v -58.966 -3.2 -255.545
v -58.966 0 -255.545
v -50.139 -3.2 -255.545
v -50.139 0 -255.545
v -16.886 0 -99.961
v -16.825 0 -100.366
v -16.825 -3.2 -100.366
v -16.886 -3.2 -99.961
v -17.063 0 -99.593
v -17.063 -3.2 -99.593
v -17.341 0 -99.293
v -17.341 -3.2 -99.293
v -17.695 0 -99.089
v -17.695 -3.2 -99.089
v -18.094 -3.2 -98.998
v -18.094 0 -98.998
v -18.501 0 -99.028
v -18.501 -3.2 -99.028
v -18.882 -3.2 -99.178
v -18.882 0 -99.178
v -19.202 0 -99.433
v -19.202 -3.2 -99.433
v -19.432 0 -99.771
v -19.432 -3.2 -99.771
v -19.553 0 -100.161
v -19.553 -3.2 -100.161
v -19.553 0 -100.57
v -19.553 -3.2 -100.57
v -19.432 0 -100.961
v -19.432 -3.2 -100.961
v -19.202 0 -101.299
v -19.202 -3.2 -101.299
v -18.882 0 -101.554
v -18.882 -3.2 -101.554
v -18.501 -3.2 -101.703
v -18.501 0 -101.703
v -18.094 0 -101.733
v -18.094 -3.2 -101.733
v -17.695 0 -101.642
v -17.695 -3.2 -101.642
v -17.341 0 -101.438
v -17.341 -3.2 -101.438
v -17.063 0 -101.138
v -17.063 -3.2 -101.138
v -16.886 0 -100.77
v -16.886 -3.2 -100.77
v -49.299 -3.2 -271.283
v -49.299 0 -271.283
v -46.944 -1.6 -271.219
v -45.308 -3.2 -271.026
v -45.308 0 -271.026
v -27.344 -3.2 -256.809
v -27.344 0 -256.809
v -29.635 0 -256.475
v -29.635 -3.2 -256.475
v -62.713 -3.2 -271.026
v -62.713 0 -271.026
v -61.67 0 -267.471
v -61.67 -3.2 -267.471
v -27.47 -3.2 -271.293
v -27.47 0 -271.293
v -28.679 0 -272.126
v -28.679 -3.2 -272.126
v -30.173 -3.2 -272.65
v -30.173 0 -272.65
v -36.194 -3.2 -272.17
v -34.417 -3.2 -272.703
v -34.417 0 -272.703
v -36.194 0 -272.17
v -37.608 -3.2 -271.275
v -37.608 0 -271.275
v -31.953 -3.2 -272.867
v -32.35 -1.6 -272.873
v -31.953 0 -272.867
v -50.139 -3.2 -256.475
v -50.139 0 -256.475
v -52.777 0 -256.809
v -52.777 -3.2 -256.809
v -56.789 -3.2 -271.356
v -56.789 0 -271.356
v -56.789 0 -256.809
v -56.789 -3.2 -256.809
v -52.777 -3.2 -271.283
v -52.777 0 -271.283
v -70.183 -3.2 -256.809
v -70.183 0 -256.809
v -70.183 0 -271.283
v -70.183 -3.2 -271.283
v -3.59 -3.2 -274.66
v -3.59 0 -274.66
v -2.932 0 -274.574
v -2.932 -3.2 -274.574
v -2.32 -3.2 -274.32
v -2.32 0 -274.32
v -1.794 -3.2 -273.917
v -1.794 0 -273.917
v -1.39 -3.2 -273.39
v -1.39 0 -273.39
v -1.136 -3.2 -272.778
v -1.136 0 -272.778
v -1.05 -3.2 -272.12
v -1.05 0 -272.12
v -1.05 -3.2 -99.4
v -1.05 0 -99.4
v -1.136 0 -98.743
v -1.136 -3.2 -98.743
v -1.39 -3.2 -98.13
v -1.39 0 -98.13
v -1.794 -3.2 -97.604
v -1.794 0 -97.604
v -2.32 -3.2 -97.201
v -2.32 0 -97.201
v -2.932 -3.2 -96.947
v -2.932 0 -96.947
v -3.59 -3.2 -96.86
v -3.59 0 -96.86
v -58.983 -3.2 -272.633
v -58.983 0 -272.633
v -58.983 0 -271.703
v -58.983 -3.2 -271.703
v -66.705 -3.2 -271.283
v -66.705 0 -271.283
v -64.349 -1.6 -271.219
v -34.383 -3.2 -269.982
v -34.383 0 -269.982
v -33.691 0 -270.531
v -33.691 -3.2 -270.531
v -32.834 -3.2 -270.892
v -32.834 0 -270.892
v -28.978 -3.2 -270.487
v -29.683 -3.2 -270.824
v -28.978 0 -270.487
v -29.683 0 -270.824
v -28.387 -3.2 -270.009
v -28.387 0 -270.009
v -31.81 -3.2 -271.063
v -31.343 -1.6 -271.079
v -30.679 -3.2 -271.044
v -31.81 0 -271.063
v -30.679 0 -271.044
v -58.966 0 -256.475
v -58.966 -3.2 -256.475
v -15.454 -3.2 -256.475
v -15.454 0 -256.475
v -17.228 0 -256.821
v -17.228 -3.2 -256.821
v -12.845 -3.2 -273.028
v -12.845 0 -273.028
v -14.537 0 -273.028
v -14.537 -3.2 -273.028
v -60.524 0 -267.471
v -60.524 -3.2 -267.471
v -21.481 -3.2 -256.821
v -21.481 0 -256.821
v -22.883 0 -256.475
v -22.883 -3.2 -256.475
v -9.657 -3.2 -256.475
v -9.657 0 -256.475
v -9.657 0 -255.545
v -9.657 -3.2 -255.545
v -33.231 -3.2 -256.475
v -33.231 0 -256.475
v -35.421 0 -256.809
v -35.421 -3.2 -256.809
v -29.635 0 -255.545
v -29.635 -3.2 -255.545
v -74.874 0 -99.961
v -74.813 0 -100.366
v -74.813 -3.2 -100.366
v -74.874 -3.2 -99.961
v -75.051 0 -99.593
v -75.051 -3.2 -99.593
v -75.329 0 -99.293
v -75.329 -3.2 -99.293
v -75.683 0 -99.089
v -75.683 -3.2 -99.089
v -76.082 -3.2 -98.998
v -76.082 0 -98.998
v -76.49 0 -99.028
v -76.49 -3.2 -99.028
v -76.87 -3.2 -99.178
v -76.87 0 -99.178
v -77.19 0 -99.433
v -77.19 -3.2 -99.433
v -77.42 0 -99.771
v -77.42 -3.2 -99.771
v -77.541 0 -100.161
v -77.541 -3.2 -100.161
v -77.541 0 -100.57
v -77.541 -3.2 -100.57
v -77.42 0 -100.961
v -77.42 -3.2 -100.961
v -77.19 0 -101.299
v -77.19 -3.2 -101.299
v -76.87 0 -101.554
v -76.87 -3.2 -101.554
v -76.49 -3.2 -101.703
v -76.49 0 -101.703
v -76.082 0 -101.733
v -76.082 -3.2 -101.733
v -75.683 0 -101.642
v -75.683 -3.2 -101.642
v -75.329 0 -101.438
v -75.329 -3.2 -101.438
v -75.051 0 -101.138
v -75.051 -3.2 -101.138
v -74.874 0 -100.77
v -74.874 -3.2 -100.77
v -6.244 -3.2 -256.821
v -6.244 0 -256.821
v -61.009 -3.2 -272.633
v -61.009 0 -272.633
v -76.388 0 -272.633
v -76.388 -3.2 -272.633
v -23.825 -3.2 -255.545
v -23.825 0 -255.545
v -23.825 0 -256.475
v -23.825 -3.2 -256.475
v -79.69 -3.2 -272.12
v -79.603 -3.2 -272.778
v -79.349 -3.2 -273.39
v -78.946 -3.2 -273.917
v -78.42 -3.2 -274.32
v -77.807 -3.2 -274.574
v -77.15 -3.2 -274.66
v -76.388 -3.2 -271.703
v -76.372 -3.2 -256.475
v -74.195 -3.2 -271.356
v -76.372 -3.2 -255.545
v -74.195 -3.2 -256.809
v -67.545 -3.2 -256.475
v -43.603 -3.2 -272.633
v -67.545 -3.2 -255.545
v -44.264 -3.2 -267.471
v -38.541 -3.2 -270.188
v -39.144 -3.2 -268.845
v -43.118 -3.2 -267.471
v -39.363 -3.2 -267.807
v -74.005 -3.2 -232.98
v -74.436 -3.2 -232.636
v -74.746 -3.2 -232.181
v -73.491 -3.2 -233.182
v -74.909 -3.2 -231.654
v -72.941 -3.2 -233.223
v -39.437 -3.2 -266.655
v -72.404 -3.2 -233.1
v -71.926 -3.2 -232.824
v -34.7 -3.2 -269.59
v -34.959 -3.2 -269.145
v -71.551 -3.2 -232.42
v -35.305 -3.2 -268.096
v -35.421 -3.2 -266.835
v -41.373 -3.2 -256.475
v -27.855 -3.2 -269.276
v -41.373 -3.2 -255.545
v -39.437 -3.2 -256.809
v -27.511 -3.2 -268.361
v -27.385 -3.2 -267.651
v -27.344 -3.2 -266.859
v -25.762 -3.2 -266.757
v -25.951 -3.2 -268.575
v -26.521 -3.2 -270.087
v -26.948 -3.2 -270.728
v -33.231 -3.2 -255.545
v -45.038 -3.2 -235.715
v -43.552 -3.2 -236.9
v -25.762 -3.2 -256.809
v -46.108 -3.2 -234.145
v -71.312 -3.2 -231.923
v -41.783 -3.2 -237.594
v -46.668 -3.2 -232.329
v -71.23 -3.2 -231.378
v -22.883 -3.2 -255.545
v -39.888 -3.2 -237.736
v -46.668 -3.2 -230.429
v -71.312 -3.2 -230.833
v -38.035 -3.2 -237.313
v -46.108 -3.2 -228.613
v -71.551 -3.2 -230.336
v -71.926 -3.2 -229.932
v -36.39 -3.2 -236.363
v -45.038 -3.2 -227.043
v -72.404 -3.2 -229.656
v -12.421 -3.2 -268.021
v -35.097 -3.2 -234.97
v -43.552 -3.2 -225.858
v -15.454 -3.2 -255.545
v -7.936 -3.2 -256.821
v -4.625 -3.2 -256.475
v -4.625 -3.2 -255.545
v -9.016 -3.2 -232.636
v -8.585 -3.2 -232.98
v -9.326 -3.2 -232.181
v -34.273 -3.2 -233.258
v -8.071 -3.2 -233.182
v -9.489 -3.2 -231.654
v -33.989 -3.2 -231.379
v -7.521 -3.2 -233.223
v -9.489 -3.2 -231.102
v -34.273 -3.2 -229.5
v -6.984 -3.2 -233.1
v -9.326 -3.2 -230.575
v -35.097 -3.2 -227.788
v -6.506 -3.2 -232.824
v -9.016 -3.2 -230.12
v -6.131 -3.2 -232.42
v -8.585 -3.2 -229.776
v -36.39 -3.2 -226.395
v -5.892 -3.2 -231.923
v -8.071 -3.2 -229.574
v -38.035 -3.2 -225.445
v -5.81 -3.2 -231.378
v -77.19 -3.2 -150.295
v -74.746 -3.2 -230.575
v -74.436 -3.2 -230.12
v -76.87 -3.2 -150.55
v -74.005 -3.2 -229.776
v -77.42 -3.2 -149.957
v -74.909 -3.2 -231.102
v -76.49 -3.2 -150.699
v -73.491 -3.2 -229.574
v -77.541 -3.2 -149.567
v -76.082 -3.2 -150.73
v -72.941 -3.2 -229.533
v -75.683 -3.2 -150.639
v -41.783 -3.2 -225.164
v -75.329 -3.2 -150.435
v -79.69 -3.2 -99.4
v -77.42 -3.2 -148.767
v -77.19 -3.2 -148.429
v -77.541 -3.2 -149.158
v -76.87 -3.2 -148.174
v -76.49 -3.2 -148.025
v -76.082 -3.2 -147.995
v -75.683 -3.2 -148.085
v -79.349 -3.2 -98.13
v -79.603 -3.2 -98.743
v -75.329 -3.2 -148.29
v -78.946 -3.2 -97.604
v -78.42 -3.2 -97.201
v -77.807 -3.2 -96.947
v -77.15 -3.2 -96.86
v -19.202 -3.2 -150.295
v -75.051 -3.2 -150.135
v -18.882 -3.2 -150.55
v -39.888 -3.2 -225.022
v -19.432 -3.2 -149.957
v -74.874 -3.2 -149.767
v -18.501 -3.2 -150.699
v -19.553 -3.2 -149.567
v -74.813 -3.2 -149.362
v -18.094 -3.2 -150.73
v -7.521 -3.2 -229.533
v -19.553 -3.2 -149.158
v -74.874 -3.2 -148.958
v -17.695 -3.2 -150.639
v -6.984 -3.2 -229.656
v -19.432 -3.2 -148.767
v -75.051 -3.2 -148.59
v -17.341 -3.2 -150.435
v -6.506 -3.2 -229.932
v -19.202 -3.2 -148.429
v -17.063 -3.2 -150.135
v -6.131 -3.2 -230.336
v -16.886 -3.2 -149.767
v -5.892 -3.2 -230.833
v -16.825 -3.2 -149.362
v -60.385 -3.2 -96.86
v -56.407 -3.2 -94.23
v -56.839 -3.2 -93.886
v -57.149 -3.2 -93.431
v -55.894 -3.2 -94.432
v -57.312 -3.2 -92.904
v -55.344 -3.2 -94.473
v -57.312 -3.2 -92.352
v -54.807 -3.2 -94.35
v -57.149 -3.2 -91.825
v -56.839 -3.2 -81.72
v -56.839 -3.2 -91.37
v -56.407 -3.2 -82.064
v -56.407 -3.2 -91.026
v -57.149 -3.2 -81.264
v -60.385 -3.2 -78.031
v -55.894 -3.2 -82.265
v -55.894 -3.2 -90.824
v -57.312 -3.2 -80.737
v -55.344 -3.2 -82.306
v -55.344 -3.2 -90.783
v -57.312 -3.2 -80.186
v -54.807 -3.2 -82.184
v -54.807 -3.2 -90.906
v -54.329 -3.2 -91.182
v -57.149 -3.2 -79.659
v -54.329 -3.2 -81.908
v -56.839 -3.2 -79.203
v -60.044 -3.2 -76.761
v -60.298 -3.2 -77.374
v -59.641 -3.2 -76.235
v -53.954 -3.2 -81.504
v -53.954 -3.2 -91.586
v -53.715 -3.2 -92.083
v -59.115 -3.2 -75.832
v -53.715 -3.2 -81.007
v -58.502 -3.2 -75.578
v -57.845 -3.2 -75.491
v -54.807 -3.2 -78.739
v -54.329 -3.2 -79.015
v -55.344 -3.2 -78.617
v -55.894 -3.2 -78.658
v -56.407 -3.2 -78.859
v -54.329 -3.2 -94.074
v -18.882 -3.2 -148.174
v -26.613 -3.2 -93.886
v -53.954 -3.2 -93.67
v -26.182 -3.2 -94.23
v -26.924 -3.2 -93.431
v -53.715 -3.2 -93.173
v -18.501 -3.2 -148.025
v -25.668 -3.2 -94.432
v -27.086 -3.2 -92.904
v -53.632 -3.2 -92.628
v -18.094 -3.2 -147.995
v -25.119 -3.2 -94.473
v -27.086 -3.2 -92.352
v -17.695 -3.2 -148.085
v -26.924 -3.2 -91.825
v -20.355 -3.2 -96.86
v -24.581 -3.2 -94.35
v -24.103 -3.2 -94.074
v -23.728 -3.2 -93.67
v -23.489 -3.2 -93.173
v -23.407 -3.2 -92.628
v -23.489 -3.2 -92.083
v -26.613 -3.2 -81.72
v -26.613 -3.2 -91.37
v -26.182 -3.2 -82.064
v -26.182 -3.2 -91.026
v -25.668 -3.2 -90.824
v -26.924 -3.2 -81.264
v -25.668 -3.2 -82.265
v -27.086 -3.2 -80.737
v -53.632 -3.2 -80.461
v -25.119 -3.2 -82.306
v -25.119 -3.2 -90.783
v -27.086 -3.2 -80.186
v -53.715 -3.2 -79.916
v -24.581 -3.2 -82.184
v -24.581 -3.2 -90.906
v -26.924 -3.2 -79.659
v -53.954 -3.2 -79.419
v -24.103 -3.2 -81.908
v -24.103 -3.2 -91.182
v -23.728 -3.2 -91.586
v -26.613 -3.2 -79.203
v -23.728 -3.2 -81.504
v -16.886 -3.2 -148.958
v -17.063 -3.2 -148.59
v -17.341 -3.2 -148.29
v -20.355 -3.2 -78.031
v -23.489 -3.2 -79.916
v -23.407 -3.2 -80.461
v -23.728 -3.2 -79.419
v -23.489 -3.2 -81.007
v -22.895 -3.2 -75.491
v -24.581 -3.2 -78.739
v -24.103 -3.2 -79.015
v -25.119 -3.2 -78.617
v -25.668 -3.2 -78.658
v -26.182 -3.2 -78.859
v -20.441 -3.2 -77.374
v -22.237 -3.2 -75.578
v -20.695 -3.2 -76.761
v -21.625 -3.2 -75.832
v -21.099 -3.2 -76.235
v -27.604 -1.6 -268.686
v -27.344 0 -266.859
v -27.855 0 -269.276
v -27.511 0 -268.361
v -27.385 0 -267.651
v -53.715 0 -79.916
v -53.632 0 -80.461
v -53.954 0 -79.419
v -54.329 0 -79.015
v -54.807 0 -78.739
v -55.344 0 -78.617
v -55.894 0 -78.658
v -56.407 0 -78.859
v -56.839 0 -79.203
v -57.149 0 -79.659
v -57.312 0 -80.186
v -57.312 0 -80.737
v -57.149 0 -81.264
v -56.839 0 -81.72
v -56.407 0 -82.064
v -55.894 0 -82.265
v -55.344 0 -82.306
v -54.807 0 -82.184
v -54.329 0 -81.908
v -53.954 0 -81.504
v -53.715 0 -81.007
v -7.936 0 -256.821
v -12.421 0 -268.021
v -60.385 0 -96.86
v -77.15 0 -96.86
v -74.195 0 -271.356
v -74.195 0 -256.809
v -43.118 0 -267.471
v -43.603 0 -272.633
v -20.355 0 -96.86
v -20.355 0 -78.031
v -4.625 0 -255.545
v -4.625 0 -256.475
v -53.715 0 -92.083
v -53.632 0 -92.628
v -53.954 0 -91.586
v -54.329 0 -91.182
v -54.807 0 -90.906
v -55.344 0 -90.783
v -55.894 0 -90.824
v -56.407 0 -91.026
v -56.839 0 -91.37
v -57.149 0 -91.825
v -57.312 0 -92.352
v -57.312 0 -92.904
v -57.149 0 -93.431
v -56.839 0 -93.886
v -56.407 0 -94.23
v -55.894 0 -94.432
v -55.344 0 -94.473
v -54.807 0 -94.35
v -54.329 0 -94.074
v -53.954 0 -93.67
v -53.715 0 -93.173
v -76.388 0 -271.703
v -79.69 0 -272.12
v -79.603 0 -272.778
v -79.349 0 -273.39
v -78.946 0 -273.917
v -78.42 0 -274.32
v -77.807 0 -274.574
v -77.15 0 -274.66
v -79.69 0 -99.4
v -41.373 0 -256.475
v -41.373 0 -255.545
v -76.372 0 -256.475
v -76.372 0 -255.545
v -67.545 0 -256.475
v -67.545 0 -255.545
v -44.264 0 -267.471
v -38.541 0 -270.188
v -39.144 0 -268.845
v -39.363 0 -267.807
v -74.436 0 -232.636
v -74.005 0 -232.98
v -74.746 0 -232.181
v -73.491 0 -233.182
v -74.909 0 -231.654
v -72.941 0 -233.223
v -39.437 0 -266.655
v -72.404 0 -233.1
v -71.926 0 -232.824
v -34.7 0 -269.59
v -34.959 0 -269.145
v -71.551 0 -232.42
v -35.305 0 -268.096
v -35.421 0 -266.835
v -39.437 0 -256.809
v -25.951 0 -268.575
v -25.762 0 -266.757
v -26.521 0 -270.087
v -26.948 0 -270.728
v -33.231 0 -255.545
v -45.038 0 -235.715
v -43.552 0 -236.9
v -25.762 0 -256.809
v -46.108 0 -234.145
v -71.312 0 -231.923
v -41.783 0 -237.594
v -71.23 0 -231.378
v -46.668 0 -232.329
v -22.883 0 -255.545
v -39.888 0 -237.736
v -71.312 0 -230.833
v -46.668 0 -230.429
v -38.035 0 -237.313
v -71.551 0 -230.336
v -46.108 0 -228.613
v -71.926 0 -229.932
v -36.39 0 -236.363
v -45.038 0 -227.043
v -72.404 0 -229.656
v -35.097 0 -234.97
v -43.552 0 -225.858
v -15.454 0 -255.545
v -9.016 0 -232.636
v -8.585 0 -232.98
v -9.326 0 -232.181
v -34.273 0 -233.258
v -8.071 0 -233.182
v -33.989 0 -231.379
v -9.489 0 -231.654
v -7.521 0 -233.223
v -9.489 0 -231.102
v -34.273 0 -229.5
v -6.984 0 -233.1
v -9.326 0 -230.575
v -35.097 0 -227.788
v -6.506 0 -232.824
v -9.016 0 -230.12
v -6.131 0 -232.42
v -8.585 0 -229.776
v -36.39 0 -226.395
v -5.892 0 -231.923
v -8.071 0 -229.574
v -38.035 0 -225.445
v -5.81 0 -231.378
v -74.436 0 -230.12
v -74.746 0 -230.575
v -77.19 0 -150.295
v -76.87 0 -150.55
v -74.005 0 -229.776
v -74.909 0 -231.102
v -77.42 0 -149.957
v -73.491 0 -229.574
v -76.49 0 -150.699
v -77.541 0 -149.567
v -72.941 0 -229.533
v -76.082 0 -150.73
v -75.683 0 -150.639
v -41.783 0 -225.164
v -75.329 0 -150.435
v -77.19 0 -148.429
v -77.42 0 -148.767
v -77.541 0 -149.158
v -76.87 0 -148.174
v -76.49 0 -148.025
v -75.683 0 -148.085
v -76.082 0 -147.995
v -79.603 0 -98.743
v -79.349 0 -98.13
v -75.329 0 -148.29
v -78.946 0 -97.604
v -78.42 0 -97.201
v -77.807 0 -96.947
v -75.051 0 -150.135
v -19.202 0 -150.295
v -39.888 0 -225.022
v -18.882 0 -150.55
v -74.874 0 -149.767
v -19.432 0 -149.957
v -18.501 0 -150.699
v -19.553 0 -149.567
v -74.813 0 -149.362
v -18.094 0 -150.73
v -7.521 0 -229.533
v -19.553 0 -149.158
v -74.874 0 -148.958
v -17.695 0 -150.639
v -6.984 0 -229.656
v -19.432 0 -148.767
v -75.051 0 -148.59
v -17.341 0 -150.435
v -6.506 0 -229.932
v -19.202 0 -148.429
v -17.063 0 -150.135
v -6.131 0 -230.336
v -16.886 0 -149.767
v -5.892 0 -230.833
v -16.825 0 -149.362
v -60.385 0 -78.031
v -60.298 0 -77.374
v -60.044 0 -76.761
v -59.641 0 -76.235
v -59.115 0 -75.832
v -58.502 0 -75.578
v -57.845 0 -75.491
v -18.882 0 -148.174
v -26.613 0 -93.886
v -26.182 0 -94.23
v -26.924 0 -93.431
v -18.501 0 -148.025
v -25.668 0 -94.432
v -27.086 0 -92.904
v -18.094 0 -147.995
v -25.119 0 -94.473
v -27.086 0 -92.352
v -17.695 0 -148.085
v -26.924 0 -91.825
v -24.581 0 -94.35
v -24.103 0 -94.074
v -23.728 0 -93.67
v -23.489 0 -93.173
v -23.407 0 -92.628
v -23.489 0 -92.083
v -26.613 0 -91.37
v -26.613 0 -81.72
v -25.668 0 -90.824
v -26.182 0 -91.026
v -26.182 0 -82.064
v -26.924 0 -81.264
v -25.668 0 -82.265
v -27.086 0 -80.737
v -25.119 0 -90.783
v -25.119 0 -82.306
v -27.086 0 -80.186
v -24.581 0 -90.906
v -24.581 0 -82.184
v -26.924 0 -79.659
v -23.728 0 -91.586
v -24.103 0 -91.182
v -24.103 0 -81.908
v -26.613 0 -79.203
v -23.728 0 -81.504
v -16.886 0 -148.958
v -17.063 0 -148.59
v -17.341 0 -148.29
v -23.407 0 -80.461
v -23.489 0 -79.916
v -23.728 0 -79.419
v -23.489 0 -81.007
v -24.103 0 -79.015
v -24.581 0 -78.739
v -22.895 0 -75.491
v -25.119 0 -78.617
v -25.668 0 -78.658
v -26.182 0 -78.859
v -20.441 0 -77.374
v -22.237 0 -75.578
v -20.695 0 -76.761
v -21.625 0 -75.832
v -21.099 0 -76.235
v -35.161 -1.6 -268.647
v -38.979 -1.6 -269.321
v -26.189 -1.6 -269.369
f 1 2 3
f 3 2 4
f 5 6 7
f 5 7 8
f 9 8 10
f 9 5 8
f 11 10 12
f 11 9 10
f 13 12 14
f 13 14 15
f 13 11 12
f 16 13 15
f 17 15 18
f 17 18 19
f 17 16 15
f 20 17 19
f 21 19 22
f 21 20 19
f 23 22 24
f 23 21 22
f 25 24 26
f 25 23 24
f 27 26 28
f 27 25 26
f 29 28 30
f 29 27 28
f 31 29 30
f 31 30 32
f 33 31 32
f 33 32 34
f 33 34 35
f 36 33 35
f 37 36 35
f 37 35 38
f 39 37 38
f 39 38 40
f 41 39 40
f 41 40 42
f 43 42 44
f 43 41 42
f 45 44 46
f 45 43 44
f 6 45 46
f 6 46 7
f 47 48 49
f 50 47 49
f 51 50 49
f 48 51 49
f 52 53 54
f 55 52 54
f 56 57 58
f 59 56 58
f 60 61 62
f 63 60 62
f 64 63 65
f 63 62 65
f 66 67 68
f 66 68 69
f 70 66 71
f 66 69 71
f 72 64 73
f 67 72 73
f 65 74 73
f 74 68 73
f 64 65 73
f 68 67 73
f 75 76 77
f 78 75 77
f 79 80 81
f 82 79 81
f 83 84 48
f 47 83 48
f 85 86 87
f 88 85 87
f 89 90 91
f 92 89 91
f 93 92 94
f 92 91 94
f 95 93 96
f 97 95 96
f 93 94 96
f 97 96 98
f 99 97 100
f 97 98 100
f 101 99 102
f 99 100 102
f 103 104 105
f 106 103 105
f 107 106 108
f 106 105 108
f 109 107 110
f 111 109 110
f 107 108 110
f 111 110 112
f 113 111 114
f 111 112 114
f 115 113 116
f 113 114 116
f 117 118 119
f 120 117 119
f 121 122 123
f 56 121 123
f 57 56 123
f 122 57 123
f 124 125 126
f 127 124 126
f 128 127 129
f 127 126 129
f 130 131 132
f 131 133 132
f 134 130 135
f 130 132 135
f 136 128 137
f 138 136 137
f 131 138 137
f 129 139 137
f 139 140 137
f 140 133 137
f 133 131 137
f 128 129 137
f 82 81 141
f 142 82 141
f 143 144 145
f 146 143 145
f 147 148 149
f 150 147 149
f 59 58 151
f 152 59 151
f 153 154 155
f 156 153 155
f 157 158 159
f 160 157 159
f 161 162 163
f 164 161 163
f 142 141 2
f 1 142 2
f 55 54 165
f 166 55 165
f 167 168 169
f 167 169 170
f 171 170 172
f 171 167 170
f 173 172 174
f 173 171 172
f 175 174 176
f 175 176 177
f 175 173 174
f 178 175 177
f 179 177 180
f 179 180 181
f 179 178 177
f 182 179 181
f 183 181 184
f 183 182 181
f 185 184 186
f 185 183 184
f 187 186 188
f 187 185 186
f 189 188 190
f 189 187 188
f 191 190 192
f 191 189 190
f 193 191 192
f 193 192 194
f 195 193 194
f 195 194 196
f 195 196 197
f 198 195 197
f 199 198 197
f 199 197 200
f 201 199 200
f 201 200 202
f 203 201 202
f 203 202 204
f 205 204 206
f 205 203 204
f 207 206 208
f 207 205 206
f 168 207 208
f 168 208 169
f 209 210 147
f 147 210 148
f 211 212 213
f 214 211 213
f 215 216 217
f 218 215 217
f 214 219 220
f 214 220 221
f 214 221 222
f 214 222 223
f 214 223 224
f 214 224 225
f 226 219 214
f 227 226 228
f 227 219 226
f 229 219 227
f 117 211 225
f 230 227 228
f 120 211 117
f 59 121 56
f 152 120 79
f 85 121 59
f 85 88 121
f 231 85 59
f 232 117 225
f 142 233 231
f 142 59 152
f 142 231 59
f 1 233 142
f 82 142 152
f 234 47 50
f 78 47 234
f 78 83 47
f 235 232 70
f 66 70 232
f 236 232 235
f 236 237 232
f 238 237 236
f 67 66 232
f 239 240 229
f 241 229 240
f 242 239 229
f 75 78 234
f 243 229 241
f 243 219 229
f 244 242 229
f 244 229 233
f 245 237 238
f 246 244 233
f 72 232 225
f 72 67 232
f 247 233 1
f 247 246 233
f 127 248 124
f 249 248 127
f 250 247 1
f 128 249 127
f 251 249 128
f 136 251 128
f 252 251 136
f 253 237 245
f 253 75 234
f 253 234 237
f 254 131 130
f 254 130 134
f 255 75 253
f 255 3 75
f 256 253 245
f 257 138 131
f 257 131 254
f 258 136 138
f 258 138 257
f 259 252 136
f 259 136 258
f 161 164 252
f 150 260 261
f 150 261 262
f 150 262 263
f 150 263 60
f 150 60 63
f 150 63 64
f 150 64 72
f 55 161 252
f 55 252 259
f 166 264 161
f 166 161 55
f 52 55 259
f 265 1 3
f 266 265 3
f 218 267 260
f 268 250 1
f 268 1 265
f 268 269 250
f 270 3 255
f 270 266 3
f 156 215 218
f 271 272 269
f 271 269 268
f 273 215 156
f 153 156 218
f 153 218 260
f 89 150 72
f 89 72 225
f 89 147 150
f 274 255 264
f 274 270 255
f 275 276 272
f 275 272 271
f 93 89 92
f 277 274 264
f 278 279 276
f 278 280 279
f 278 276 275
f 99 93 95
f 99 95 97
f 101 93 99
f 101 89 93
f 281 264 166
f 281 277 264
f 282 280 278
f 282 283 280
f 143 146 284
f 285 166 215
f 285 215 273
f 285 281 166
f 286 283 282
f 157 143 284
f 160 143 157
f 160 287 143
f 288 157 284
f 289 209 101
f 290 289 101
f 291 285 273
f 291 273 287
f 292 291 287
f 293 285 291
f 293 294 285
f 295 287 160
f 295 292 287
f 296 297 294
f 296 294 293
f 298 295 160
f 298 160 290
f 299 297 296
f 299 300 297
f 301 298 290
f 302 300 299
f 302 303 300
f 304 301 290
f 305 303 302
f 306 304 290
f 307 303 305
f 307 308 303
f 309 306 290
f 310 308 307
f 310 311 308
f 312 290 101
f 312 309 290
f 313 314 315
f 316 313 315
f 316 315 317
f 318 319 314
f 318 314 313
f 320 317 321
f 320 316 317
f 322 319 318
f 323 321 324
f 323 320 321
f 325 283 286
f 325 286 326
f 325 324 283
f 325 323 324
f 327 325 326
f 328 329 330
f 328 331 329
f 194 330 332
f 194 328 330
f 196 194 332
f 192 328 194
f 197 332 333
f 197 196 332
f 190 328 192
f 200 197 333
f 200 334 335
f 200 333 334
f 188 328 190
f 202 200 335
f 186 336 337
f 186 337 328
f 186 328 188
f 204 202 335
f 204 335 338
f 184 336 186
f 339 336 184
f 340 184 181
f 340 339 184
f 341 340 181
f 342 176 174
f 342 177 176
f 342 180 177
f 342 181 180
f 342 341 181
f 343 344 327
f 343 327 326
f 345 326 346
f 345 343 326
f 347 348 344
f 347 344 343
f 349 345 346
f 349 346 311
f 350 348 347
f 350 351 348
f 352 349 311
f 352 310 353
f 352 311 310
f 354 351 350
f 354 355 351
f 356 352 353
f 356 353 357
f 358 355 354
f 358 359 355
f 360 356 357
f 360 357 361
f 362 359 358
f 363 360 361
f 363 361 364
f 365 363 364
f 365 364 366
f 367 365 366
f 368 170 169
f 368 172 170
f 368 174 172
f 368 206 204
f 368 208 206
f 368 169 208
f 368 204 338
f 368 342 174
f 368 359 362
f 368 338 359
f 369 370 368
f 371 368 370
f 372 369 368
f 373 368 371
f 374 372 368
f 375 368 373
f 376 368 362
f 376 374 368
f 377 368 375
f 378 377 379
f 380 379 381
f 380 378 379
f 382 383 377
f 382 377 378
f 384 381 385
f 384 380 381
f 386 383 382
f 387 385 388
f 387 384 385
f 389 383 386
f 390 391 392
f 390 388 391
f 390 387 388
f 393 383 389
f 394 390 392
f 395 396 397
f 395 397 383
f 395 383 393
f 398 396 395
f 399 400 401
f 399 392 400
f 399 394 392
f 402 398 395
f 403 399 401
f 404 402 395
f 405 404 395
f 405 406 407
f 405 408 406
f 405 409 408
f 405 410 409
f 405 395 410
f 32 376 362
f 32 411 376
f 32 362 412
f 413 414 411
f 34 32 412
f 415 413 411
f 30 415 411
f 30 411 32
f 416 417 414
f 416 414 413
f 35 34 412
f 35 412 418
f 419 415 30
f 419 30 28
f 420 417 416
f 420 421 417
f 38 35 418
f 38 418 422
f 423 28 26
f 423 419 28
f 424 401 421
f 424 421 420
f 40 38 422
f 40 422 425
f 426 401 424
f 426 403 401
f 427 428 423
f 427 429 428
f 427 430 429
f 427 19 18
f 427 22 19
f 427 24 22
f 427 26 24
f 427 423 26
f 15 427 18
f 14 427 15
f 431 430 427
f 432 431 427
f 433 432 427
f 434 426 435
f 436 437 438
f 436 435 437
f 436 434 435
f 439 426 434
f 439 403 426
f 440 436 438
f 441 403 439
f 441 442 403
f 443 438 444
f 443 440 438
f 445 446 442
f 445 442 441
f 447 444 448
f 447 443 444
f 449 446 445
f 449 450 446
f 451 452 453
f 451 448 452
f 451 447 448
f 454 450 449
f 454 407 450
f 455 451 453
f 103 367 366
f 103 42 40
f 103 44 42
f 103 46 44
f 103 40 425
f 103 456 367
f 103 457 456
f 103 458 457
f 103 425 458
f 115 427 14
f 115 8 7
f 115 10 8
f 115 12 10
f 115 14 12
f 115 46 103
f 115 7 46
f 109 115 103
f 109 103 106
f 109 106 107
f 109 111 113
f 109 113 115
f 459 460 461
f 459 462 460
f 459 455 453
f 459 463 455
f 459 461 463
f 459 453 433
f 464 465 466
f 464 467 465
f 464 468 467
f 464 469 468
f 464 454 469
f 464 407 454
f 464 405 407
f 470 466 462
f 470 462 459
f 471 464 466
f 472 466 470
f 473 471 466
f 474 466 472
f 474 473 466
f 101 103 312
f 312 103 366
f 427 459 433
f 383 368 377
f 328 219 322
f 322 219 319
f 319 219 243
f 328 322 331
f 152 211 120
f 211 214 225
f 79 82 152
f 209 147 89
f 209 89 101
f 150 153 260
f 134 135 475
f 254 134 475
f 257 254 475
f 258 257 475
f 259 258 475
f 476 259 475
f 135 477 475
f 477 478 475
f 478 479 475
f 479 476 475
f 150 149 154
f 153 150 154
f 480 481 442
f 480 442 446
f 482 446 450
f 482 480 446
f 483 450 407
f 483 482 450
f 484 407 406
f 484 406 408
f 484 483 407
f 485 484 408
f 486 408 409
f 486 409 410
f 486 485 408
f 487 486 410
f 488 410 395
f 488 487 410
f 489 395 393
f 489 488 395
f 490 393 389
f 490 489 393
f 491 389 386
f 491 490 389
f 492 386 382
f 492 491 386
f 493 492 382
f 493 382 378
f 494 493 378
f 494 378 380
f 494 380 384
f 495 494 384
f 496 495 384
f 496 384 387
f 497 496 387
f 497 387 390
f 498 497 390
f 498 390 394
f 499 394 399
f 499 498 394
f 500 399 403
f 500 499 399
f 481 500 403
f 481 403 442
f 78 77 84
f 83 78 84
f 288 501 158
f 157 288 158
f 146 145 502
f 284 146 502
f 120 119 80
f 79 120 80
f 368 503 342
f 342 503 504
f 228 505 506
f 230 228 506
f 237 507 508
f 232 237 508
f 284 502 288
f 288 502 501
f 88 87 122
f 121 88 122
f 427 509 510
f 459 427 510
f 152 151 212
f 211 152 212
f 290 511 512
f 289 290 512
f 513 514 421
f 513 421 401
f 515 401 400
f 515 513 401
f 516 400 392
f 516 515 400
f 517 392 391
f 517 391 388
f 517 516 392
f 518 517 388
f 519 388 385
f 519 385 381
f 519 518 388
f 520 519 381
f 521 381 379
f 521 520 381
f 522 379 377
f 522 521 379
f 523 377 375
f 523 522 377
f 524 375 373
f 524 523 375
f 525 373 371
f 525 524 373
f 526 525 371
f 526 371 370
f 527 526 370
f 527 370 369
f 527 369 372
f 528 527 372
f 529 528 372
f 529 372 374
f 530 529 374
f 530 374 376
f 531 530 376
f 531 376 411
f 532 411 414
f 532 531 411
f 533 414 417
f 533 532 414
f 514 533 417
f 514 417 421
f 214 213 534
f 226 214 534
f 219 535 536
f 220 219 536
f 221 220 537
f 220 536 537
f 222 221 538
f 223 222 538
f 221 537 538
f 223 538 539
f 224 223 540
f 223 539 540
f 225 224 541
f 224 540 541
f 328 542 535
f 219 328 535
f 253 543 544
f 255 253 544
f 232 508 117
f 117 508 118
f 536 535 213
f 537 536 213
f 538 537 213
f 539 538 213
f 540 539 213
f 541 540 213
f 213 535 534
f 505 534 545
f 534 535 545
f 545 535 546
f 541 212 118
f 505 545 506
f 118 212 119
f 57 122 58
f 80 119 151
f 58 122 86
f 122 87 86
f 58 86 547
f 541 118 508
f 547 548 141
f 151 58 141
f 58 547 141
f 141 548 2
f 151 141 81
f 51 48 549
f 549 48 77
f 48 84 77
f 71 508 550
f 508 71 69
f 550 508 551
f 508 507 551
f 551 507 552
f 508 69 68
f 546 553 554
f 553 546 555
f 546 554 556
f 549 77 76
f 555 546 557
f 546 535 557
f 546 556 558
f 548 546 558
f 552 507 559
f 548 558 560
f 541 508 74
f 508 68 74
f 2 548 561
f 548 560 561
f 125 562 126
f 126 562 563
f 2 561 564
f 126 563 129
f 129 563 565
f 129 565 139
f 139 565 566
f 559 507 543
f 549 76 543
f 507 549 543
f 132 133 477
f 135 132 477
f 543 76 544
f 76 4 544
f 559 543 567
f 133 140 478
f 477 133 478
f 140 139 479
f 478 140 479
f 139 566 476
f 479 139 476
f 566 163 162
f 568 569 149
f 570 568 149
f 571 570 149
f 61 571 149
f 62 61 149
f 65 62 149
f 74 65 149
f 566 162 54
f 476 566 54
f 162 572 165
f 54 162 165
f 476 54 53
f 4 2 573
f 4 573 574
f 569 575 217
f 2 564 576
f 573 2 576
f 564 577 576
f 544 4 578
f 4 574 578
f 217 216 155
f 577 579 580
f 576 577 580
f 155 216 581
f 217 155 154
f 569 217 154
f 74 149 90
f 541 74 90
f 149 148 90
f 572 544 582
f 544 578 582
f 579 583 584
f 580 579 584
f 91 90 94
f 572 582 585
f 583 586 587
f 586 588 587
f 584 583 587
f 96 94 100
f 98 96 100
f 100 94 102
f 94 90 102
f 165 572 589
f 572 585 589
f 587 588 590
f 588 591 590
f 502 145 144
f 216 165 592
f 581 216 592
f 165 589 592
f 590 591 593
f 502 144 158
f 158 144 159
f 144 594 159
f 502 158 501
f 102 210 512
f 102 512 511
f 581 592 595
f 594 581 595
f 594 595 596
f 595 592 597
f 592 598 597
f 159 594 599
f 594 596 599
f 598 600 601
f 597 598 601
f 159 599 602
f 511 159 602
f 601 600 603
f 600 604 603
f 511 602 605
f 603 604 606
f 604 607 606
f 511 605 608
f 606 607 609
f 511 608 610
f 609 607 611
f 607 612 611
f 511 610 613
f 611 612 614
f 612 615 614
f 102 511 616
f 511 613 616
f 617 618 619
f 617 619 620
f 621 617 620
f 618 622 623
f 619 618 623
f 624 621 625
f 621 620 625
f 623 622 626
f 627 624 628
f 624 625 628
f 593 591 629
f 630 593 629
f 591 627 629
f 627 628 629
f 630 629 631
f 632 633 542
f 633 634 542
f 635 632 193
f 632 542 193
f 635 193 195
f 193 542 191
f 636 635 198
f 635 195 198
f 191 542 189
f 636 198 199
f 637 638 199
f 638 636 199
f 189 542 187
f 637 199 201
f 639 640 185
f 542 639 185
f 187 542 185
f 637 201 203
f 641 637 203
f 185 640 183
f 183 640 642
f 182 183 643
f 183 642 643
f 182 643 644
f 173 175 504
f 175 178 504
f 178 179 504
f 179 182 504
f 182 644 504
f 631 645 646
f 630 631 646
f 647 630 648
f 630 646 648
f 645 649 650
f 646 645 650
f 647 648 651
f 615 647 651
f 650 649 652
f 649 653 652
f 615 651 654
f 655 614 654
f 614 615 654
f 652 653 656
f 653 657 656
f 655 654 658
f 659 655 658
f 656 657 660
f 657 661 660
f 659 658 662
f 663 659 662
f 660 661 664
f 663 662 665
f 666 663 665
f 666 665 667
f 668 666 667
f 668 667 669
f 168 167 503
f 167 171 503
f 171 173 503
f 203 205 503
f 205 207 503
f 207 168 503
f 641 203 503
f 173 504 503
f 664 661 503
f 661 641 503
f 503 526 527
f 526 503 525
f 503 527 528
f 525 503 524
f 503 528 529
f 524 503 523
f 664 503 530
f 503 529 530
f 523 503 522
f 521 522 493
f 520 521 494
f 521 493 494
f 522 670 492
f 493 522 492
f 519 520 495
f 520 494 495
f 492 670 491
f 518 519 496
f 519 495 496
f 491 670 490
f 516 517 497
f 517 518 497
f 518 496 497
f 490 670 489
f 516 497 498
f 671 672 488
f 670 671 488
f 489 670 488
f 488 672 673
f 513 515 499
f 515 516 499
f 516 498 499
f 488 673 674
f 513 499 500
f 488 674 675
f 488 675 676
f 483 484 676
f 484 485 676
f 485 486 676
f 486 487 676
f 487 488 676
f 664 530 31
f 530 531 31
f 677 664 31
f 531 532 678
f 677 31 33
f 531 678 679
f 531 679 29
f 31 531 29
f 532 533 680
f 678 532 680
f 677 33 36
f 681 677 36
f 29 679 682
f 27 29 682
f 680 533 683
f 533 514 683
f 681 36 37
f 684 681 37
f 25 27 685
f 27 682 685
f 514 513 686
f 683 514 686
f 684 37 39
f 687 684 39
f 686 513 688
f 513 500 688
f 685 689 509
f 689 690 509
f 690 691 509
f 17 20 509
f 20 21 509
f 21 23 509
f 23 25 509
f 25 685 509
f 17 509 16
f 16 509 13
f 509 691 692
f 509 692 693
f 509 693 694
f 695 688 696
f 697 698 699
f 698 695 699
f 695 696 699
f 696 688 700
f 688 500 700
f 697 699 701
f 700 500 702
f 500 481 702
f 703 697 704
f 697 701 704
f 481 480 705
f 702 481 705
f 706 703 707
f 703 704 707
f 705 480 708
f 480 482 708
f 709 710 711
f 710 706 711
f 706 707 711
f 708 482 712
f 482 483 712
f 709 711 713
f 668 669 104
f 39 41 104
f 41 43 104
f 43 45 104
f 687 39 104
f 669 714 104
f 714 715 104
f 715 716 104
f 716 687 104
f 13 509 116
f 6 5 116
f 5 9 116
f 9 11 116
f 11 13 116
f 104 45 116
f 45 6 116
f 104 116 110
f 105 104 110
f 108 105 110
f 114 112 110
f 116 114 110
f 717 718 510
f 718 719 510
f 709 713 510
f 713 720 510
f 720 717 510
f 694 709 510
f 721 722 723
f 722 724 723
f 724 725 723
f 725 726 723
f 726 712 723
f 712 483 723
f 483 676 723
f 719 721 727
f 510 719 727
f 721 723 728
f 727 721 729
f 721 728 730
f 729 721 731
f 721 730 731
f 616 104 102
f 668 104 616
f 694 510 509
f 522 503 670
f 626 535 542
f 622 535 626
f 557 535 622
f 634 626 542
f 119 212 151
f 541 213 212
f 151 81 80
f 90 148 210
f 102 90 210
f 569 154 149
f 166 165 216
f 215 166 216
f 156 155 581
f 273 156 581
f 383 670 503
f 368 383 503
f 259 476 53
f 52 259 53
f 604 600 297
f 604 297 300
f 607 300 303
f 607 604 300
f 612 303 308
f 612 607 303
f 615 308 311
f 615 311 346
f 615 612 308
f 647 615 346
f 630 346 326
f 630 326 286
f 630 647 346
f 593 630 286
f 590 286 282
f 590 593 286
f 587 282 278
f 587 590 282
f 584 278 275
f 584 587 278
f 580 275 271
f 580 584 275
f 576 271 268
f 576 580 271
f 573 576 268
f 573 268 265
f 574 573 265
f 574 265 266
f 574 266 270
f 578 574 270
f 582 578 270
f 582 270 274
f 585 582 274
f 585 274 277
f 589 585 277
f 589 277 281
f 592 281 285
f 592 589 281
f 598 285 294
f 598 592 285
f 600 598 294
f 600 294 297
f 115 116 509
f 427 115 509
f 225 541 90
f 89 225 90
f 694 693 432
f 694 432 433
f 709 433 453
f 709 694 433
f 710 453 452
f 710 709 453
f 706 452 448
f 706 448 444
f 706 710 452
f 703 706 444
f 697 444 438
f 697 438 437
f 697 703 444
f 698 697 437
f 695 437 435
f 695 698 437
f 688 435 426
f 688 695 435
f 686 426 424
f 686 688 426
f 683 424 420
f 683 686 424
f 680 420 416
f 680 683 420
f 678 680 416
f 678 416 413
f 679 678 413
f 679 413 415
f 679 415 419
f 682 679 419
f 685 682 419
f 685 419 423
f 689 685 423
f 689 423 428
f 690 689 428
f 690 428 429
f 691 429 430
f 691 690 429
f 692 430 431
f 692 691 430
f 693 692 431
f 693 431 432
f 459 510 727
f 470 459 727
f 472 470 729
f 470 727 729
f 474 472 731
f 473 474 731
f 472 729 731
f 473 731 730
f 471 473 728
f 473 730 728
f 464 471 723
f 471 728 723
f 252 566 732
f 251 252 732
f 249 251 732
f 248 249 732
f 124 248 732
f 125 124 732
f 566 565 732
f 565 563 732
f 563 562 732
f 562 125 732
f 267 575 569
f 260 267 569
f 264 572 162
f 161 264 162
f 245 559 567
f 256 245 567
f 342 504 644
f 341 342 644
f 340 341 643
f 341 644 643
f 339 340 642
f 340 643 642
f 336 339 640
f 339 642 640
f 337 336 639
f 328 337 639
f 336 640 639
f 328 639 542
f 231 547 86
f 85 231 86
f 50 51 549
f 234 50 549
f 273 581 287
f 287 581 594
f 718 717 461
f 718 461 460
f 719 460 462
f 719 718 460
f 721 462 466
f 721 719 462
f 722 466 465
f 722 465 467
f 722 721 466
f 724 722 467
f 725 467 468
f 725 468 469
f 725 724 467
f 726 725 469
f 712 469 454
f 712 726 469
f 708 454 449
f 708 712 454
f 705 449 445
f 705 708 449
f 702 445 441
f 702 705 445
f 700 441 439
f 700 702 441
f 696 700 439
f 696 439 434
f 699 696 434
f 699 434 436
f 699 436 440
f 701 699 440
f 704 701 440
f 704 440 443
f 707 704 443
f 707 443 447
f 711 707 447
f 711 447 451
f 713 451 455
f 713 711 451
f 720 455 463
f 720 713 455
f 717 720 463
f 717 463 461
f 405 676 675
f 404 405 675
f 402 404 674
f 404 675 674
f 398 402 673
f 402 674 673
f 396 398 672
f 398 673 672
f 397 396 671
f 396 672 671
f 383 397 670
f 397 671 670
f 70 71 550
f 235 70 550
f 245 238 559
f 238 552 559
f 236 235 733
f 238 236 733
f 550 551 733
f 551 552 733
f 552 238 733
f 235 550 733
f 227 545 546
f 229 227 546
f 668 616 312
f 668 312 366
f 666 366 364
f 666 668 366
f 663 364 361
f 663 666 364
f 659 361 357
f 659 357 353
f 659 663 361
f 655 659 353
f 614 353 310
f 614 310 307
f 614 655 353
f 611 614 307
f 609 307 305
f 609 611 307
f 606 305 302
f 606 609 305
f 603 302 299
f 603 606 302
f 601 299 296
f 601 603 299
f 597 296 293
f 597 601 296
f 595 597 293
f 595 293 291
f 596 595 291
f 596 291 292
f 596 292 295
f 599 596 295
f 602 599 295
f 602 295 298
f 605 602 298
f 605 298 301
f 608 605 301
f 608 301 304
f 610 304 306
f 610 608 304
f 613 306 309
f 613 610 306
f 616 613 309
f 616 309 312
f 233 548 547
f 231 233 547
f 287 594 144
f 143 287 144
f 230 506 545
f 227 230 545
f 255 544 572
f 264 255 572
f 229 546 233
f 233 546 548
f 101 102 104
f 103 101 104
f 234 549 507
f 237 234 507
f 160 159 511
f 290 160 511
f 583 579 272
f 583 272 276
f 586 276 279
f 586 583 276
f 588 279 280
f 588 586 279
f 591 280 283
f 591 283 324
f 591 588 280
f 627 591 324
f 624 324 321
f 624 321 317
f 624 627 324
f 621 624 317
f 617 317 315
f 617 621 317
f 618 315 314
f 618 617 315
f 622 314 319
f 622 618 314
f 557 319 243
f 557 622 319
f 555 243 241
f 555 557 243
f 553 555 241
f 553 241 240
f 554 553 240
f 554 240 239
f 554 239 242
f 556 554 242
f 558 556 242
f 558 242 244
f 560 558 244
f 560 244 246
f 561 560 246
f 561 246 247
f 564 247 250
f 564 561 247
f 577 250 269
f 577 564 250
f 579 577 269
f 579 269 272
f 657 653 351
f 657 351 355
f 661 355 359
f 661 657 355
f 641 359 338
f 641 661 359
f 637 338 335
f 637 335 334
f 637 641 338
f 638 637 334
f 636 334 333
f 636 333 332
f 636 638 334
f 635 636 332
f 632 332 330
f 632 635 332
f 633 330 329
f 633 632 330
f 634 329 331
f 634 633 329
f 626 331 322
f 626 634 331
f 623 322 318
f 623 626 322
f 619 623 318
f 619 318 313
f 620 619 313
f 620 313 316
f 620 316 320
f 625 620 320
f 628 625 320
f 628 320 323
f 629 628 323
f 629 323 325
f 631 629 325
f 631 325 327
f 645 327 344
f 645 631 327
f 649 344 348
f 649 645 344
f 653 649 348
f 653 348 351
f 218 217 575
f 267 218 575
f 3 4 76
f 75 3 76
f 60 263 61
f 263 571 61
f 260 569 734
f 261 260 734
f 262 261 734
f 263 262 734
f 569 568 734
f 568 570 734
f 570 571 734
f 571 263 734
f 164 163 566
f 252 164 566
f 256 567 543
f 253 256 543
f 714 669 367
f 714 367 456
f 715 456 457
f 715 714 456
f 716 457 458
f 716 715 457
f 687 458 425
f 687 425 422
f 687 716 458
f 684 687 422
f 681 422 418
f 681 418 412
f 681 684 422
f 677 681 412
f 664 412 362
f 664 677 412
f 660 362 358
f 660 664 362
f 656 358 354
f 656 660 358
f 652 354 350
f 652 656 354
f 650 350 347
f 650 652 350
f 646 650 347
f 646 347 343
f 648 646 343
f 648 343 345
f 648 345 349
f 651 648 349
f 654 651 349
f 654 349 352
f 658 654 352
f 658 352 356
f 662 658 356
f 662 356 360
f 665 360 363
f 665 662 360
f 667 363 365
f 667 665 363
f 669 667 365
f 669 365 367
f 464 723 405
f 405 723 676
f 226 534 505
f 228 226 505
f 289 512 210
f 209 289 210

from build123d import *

# Parameters (mm, degrees)
F0_R     = 1.85
F0_R_2   = 6.375
F0_R_3   = 1.3716
F1_DEPTH = 3.2004


with BuildPart() as f1:
    # F0 (on Front) → F1 (new body)
    with BuildSketch(Plane.XZ):
        with BuildLine():
            ThreePointArc((-79.689629, -272.1204697257), (-78.9456802243, -273.91652095), (-77.149629, -274.6604697257))
            Line((-77.149629, -274.6604697257), (-3.589629, -274.6604697257))
            ThreePointArc((-3.589629, -274.6604697257), (-1.7935777758, -273.9165209499), (-1.049629, -272.1204697257))
            Line((-1.049629, -272.1204697257), (-1.049629, -99.4004697257))
            ThreePointArc((-1.049629, -99.4004697257), (-1.7935777758, -97.6044185016), (-3.589629, -96.8604697257))
            Line((-3.589629, -96.8604697257), (-20.354629, -96.8604697257))
            Line((-20.354629, -96.8604697257), (-20.354629, -78.0314697257))
            ThreePointArc((-20.354629, -78.0314697257), (-21.0985777758, -76.2354185016), (-22.894629, -75.4914697257))
            Line((-22.894629, -75.4914697257), (-57.844629, -75.4914697257))
            ThreePointArc((-57.844629, -75.4914697257), (-59.6406802243, -76.2354185015), (-60.384629, -78.0314697257))
            Line((-60.384629, -78.0314697257), (-60.384629, -96.8604697257))
            Line((-60.384629, -96.8604697257), (-77.149629, -96.8604697257))
            ThreePointArc((-77.149629, -96.8604697257), (-78.9456802243, -97.6044185015), (-79.689629, -99.4004697257))
            Line((-79.689629, -99.4004697257), (-79.689629, -272.1204697257))
        make_face()
        with BuildLine():
            Line((-67.5448753625, -255.545025575), (-67.5448753625, -256.4746303251))
            Line((-67.5448753625, -256.4746303251), (-70.1828327017, -256.808961858))
            Line((-70.1828327017, -256.808961858), (-70.1828327017, -271.2830709061))
            Line((-70.1828327017, -271.2830709061), (-66.7049693163, -271.2830709061))
            add(Edge.make_bspline(
                [(-66.7049693163, -271.2830709061), (-63.9895449146, -271.2830709061), (-62.7133769901, -271.0262064356)],
                knots=[0, 0, 0, 1, 1, 1], degree=2))
            Line((-62.7133769901, -271.0262064356), (-61.6696102531, -267.4708759878))
            Line((-61.6696102531, -267.4708759878), (-60.5239131707, -267.4708759878))
            Line((-60.5239131707, -267.4708759878), (-61.0091016149, -272.6326286793))
            Line((-61.0091016149, -272.6326286793), (-76.3883521301, -272.6326286793))
            Line((-76.3883521301, -272.6326286793), (-76.3883521301, -271.7030239291))
            Line((-76.3883521301, -271.7030239291), (-74.1948110969, -271.3564607548))
            Line((-74.1948110969, -271.3564607548), (-74.1948110969, -256.808961858))
            Line((-74.1948110969, -256.808961858), (-76.3720432749, -256.4746303251))
            Line((-76.3720432749, -256.4746303251), (-76.3720432749, -255.545025575))
            Line((-76.3720432749, -255.545025575), (-67.5448753625, -255.545025575))
        make_face(mode=Mode.SUBTRACT)
        with Locations((-73.079629, -231.3779697257)):
            Circle(F0_R, mode=Mode.SUBTRACT)
        with BuildLine():
            Line((-50.1392495805, -255.545025575), (-50.1392495805, -256.4746303251))
            Line((-50.1392495805, -256.4746303251), (-52.7772069197, -256.808961858))
            Line((-52.7772069197, -256.808961858), (-52.7772069197, -271.2830709061))
            Line((-52.7772069197, -271.2830709061), (-49.2993435343, -271.2830709061))
            add(Edge.make_bspline(
                [(-49.2993435343, -271.2830709061), (-46.5839191327, -271.2830709061), (-45.3077512081, -271.0262064356)],
                knots=[0, 0, 0, 1, 1, 1], degree=2))
            Line((-45.3077512081, -271.0262064356), (-44.2639844712, -267.4708759878))
            Line((-44.2639844712, -267.4708759878), (-43.1182873888, -267.4708759878))
            Line((-43.1182873888, -267.4708759878), (-43.6034758329, -272.6326286793))
            Line((-43.6034758329, -272.6326286793), (-58.9827263482, -272.6326286793))
            Line((-58.9827263482, -272.6326286793), (-58.9827263482, -271.7030239291))
            Line((-58.9827263482, -271.7030239291), (-56.789185315, -271.3564607548))
            Line((-56.789185315, -271.3564607548), (-56.789185315, -256.808961858))
            Line((-56.789185315, -256.808961858), (-58.9664174929, -256.4746303251))
            Line((-58.9664174929, -256.4746303251), (-58.9664174929, -255.545025575))
            Line((-58.9664174929, -255.545025575), (-50.1392495805, -255.545025575))
        make_face(mode=Mode.SUBTRACT)
        with BuildLine():
            add(Edge.make_bspline(
                [(-34.3828567872, -269.9824396987), (-33.345205871, -271.0792102152), (-31.3432938872, -271.0792102152)],
                knots=[0, 0, 0, 1, 1, 1], degree=2))
            add(Edge.make_bspline(
                [(-31.3432938872, -271.0792102152), (-29.4310806073, -271.0792102152), (-28.3873138703, -270.0089415885)],
                knots=[0, 0, 0, 1, 1, 1], degree=2))
            add(Edge.make_bspline(
                [(-28.3873138703, -270.0089415885), (-27.3435471333, -268.9386729617), (-27.3435471333, -266.8592939153)],
                knots=[0, 0, 0, 1, 1, 1], degree=2))
            Line((-27.3435471333, -266.8592939153), (-27.3435471333, -256.808961858))
            Line((-27.3435471333, -256.808961858), (-29.6349412981, -256.4746303251))
            Line((-29.6349412981, -256.4746303251), (-29.6349412981, -255.545025575))
            Line((-29.6349412981, -255.545025575), (-23.8249116098, -255.545025575))
            Line((-23.8249116098, -255.545025575), (-23.8249116098, -256.4746303251))
            Line((-23.8249116098, -256.4746303251), (-25.7615881726, -256.808961858))
            Line((-25.7615881726, -256.808961858), (-25.7615881726, -266.7573635699))
            add(Edge.make_bspline(
                [(-25.7615881726, -266.7573635699), (-25.7615881726, -269.7133435868), (-27.4699407616, -271.2932639406)],
                knots=[0, 0, 0, 1, 1, 1], degree=2))
            add(Edge.make_bspline(
                [(-27.4699407616, -271.2932639406), (-29.1782933507, -272.8731842944), (-32.3503656998, -272.8731842944)],
                knots=[0, 0, 0, 1, 1, 1], degree=2))
            add(Edge.make_bspline(
                [(-32.3503656998, -272.8731842944), (-35.7793025193, -272.8731842944), (-37.607932916, -271.2749164784)],
                knots=[0, 0, 0, 1, 1, 1], degree=2))
            add(Edge.make_bspline(
                [(-37.607932916, -271.2749164784), (-39.4365633126, -269.6766486624), (-39.4365633126, -266.6554332245)],
                knots=[0, 0, 0, 1, 1, 1], degree=2))
            Line((-39.4365633126, -266.6554332245), (-39.4365633126, -256.808961858))
            Line((-39.4365633126, -256.808961858), (-41.3732398754, -256.4746303251))
            Line((-41.3732398754, -256.4746303251), (-41.3732398754, -255.545025575))
            Line((-41.3732398754, -255.545025575), (-33.2310438841, -255.545025575))
            Line((-33.2310438841, -255.545025575), (-33.2310438841, -256.4746303251))
            Line((-33.2310438841, -256.4746303251), (-35.4205077035, -256.808961858))
            Line((-35.4205077035, -256.808961858), (-35.4205077035, -266.8348306324))
            add(Edge.make_bspline(
                [(-35.4205077035, -266.8348306324), (-35.4205077035, -268.8856691821), (-34.3828567872, -269.9824396987)],
                knots=[0, 0, 0, 1, 1, 1], degree=2))
        make_face(mode=Mode.SUBTRACT)
        with Locations((-40.364429, -231.3788697257)):
            Circle(F0_R_2, mode=Mode.SUBTRACT)
        Polygon((-9.656593598, -255.545025575), (-4.6253117486, -255.545025575), (-4.6253117486, -256.4746303251), (-6.2439656337, -256.8211934995), (-12.8449748024, -273.0281184195), (-14.5370185362, -273.0281184195), (-21.4805136654, -256.8211934995), (-22.8830752182, -256.4746303251), (-22.8830752182, -255.545025575), (-15.4543916449, -255.545025575), (-15.4543916449, -256.4746303251), (-17.227979655, -256.8211934995), (-12.4209445655, -268.021299853), (-7.9360093675, -256.8211934995), (-9.656593598, -256.4746303251), align=None, mode=Mode.SUBTRACT)
        with Locations((-7.659629, -231.3779697257)):
            Circle(F0_R, mode=Mode.SUBTRACT)
        with Locations((-76.184429, -149.3622697257)):
            Circle(F0_R_3, mode=Mode.SUBTRACT)
        with Locations((-76.184429, -100.3656697257)):
            Circle(F0_R_3, mode=Mode.SUBTRACT)
        with Locations((-55.482429, -92.6280697257)):
            Circle(F0_R, mode=Mode.SUBTRACT)
        with Locations((-55.482429, -80.4614697257)):
            Circle(F0_R, mode=Mode.SUBTRACT)
        with Locations((-18.196229, -149.3622697257)):
            Circle(F0_R_3, mode=Mode.SUBTRACT)
        with Locations((-25.256829, -92.6280697257)):
            Circle(F0_R, mode=Mode.SUBTRACT)
        with Locations((-25.256829, -80.4614697257)):
            Circle(F0_R, mode=Mode.SUBTRACT)
        with Locations((-18.196229, -100.3656697257)):
            Circle(F0_R_3, mode=Mode.SUBTRACT)
    extrude(amount=F1_DEPTH)


solid = f1.part
